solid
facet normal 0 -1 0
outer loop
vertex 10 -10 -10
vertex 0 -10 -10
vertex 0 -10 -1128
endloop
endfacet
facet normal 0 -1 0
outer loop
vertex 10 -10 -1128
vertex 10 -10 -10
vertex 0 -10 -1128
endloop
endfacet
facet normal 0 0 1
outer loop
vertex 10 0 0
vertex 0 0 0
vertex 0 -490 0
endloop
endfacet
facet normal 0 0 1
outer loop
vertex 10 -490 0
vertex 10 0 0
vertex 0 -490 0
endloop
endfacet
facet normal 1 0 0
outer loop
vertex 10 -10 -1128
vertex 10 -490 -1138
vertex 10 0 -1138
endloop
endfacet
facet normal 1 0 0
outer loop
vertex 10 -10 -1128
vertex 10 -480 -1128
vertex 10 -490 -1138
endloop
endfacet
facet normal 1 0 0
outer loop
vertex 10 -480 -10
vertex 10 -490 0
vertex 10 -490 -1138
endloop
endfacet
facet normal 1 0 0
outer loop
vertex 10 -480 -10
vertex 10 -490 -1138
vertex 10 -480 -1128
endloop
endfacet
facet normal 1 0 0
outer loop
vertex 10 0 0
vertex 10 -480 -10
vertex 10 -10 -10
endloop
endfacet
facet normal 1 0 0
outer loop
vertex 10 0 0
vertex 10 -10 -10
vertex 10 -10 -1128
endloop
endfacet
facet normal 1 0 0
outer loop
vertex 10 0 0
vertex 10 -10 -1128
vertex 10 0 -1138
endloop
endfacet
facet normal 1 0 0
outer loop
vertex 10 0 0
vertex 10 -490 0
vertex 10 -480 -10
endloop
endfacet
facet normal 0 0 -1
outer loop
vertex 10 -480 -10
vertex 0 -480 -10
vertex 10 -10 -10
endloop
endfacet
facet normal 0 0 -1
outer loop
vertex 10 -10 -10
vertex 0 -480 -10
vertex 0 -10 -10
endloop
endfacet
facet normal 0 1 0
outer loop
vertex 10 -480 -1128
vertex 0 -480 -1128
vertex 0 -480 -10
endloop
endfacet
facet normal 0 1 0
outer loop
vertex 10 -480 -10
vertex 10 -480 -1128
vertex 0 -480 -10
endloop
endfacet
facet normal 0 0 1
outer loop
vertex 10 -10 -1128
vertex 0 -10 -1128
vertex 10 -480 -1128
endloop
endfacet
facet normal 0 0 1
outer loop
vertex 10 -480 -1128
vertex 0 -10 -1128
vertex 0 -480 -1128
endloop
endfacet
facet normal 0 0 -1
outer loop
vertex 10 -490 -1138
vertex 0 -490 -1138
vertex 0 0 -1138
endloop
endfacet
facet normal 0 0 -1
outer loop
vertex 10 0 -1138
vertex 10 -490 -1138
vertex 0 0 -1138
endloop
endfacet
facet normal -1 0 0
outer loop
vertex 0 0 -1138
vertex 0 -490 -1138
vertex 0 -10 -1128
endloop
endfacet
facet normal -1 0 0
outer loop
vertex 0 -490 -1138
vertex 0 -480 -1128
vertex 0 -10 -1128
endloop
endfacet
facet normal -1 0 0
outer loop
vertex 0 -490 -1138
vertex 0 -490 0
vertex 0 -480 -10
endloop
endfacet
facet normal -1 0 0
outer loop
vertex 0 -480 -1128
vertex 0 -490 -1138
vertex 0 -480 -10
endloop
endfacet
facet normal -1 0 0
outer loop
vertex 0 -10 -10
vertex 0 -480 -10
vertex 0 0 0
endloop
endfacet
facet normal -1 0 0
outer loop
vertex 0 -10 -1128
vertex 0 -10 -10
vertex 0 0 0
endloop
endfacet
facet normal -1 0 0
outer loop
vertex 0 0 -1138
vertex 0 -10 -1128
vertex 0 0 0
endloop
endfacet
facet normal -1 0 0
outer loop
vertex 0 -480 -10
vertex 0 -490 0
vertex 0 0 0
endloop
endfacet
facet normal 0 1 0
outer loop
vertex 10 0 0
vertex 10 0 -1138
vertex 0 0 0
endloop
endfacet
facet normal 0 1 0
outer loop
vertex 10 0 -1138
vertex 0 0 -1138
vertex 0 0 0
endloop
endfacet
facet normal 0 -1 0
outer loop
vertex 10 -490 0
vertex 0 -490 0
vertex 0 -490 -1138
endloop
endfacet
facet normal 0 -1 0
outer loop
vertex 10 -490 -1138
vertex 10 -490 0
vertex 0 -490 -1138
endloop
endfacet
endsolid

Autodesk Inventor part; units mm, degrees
ref_plane "YZ Plane" through (0, 0, 0) normal (1, 0, 0) x (0, 1, 0)
ref_plane "XZ Plane" through (0, 0, 0) normal (0, 1, 0) x (-1, 0, 0)
ref_plane "XY Plane" through (0, 0, 0) normal (0, 0, 1) x (1, 0, 0)
sketch "Sketch1" plane through (0, 0, 0) normal (1, 0, 0) x (0, 1, 0)
  line L0 (0, 0) -> (-490, 0)
  line L1 (-490, 0) -> (-490, -1138)
  line L2 (-490, -1138) -> (0, -1138)
  line L3 (0, -1138) -> (0, 0)
  line L4 (-480, -1128) -> (-480, -10)
  line L5 (-480, -10) -> (-10, -10)
  line L6 (-10, -10) -> (-10, -1128)
  line L7 (-10, -1128) -> (-480, -1128)
  dimension "d0" = 490
  dimension "portaAltura" = 1138
  dimension "d2" = 10
  dimension "portaLargura" = 470
extrude "Extrusion1" add sketch "Sketch1" along normal blind 10
sketch "Sketch2" plane through (0, -490, 0) normal (0, 0, 1) x (1, 0, 0)
  line L0 (0, 490) -> (0, 0) projected
  line L1 (0, 0) -> (10, 0) projected
  line L2 (10, 490) -> (10, 0) projected
  line L3 (0, 490) -> (10, 490) projected
  line L4 (0, 0) -> (-3.182, -3.182)
  line L5 (0, 0) -> (4.5, 0) construction
  line L6 (0, 490) -> (0, 0) projected
  circle A0 centre (-3.182, -3.182) radius 5
  circle A1 centre (-3.182, -3.182) radius 4
  dimension "d5" = 4.5
  dimension "d6" = 135
  dimension "d7" = 1
  dimension "d10" = 10
extrude "Extrusion2" [suppressed]
ref_plane "Work Plane1" through (0, 0, -569) normal (0, 0, 1) x (1, 0, 0)
mirror "Mirror1" [suppressed]
fillet "Fillet1" [suppressed]
ref_plane "Work Plane2" through (0, -490, -1113) normal (0, 0, 1) x (1, 0, 0)
sketch "Sketch3" plane through (0, -490, -1113) normal (0, 0, 1) x (1, 0, 0)
  arc A0 (0, 0.6748) -> (0.6748, 0) centre (-3.182, -3.182) ccw projected
  circle A1 centre (-3.182, -3.182) radius 4 projected
  line L0 (0.6748, 0) -> (10, 0) projected
  circle A2 centre (-3.182, -3.182) radius 5
  point P0 (0, 490)
  point P1 (0, 0.6748)
extrude "Extrusion3" [suppressed]
sketch "Sketch4" plane through (0, 0, 0) normal (0, 0, 1) x (1, 0, 0)
  circle A0 centre (-3.182, -493.182) radius 4 projected
  arc A1 (0, -489.3252) -> (0.6748, -490) centre (-3.182, -493.182) ccw projected
  circle A2 centre (-3.182, -493.182) radius 4 projected
  line L0 (0, -490) -> (10, -490) projected
  circle A3 centre (-3.182, -493.182) radius 5
  point P0 (0, 0)
  point P1 (0, -489.3252)
extrude "Extrusion4" [suppressed]
sketch "Sketch5" plane through (0, -490, -35) normal (0, 0, -1) x (-1, 0, 0)
  circle A0 centre (3.182, -3.182) radius 4 projected
  arc A1 (-0.6748, 0) -> (0, 0.6748) centre (3.182, -3.182) ccw projected
  circle A2 centre (3.182, -3.182) radius 5
  point P0 (0, 490)
  point P1 (0, 0.6748)
extrude "Extrusion5" [suppressed]
sketch "Sketch6" plane through (0, 0, 0) normal (0, 0, 1) x (1, 0, 0)
  line L0 (0, -490) -> (10, -490) projected
  line L1 (10, 0) -> (10, -490) projected
  line L2 (0, 0) -> (10, 0) projected
  line L3 (0, 0) -> (0, -490) projected
  line L4 (10, -490) -> (10, 0) construction
  line L5 (0, -10) -> (10, -10) construction
  line L6 (10, 0) -> (0, -10) construction
  line L7 (0, 0) -> (10, 0) construction
  line L8 (0, 0) -> (10, -10) construction
  circle A0 centre (5, -5) radius 2.5
  dimension "d19" = 5
extrude "Extrusion6" [suppressed]
sketch "Sketch7" plane through (5, -5, 10) normal (0, 0, 1) x (1, 0, 0)
  circle A0 centre (0, 0) radius 2.5 projected
  circle A1 centre (0, 0) radius 5
  point P0 (-5, 5)
  dimension "d22" = 10
extrude "Extrusion7" [suppressed]
mirror "Mirror2" [suppressed]
properties part number "porta1"
